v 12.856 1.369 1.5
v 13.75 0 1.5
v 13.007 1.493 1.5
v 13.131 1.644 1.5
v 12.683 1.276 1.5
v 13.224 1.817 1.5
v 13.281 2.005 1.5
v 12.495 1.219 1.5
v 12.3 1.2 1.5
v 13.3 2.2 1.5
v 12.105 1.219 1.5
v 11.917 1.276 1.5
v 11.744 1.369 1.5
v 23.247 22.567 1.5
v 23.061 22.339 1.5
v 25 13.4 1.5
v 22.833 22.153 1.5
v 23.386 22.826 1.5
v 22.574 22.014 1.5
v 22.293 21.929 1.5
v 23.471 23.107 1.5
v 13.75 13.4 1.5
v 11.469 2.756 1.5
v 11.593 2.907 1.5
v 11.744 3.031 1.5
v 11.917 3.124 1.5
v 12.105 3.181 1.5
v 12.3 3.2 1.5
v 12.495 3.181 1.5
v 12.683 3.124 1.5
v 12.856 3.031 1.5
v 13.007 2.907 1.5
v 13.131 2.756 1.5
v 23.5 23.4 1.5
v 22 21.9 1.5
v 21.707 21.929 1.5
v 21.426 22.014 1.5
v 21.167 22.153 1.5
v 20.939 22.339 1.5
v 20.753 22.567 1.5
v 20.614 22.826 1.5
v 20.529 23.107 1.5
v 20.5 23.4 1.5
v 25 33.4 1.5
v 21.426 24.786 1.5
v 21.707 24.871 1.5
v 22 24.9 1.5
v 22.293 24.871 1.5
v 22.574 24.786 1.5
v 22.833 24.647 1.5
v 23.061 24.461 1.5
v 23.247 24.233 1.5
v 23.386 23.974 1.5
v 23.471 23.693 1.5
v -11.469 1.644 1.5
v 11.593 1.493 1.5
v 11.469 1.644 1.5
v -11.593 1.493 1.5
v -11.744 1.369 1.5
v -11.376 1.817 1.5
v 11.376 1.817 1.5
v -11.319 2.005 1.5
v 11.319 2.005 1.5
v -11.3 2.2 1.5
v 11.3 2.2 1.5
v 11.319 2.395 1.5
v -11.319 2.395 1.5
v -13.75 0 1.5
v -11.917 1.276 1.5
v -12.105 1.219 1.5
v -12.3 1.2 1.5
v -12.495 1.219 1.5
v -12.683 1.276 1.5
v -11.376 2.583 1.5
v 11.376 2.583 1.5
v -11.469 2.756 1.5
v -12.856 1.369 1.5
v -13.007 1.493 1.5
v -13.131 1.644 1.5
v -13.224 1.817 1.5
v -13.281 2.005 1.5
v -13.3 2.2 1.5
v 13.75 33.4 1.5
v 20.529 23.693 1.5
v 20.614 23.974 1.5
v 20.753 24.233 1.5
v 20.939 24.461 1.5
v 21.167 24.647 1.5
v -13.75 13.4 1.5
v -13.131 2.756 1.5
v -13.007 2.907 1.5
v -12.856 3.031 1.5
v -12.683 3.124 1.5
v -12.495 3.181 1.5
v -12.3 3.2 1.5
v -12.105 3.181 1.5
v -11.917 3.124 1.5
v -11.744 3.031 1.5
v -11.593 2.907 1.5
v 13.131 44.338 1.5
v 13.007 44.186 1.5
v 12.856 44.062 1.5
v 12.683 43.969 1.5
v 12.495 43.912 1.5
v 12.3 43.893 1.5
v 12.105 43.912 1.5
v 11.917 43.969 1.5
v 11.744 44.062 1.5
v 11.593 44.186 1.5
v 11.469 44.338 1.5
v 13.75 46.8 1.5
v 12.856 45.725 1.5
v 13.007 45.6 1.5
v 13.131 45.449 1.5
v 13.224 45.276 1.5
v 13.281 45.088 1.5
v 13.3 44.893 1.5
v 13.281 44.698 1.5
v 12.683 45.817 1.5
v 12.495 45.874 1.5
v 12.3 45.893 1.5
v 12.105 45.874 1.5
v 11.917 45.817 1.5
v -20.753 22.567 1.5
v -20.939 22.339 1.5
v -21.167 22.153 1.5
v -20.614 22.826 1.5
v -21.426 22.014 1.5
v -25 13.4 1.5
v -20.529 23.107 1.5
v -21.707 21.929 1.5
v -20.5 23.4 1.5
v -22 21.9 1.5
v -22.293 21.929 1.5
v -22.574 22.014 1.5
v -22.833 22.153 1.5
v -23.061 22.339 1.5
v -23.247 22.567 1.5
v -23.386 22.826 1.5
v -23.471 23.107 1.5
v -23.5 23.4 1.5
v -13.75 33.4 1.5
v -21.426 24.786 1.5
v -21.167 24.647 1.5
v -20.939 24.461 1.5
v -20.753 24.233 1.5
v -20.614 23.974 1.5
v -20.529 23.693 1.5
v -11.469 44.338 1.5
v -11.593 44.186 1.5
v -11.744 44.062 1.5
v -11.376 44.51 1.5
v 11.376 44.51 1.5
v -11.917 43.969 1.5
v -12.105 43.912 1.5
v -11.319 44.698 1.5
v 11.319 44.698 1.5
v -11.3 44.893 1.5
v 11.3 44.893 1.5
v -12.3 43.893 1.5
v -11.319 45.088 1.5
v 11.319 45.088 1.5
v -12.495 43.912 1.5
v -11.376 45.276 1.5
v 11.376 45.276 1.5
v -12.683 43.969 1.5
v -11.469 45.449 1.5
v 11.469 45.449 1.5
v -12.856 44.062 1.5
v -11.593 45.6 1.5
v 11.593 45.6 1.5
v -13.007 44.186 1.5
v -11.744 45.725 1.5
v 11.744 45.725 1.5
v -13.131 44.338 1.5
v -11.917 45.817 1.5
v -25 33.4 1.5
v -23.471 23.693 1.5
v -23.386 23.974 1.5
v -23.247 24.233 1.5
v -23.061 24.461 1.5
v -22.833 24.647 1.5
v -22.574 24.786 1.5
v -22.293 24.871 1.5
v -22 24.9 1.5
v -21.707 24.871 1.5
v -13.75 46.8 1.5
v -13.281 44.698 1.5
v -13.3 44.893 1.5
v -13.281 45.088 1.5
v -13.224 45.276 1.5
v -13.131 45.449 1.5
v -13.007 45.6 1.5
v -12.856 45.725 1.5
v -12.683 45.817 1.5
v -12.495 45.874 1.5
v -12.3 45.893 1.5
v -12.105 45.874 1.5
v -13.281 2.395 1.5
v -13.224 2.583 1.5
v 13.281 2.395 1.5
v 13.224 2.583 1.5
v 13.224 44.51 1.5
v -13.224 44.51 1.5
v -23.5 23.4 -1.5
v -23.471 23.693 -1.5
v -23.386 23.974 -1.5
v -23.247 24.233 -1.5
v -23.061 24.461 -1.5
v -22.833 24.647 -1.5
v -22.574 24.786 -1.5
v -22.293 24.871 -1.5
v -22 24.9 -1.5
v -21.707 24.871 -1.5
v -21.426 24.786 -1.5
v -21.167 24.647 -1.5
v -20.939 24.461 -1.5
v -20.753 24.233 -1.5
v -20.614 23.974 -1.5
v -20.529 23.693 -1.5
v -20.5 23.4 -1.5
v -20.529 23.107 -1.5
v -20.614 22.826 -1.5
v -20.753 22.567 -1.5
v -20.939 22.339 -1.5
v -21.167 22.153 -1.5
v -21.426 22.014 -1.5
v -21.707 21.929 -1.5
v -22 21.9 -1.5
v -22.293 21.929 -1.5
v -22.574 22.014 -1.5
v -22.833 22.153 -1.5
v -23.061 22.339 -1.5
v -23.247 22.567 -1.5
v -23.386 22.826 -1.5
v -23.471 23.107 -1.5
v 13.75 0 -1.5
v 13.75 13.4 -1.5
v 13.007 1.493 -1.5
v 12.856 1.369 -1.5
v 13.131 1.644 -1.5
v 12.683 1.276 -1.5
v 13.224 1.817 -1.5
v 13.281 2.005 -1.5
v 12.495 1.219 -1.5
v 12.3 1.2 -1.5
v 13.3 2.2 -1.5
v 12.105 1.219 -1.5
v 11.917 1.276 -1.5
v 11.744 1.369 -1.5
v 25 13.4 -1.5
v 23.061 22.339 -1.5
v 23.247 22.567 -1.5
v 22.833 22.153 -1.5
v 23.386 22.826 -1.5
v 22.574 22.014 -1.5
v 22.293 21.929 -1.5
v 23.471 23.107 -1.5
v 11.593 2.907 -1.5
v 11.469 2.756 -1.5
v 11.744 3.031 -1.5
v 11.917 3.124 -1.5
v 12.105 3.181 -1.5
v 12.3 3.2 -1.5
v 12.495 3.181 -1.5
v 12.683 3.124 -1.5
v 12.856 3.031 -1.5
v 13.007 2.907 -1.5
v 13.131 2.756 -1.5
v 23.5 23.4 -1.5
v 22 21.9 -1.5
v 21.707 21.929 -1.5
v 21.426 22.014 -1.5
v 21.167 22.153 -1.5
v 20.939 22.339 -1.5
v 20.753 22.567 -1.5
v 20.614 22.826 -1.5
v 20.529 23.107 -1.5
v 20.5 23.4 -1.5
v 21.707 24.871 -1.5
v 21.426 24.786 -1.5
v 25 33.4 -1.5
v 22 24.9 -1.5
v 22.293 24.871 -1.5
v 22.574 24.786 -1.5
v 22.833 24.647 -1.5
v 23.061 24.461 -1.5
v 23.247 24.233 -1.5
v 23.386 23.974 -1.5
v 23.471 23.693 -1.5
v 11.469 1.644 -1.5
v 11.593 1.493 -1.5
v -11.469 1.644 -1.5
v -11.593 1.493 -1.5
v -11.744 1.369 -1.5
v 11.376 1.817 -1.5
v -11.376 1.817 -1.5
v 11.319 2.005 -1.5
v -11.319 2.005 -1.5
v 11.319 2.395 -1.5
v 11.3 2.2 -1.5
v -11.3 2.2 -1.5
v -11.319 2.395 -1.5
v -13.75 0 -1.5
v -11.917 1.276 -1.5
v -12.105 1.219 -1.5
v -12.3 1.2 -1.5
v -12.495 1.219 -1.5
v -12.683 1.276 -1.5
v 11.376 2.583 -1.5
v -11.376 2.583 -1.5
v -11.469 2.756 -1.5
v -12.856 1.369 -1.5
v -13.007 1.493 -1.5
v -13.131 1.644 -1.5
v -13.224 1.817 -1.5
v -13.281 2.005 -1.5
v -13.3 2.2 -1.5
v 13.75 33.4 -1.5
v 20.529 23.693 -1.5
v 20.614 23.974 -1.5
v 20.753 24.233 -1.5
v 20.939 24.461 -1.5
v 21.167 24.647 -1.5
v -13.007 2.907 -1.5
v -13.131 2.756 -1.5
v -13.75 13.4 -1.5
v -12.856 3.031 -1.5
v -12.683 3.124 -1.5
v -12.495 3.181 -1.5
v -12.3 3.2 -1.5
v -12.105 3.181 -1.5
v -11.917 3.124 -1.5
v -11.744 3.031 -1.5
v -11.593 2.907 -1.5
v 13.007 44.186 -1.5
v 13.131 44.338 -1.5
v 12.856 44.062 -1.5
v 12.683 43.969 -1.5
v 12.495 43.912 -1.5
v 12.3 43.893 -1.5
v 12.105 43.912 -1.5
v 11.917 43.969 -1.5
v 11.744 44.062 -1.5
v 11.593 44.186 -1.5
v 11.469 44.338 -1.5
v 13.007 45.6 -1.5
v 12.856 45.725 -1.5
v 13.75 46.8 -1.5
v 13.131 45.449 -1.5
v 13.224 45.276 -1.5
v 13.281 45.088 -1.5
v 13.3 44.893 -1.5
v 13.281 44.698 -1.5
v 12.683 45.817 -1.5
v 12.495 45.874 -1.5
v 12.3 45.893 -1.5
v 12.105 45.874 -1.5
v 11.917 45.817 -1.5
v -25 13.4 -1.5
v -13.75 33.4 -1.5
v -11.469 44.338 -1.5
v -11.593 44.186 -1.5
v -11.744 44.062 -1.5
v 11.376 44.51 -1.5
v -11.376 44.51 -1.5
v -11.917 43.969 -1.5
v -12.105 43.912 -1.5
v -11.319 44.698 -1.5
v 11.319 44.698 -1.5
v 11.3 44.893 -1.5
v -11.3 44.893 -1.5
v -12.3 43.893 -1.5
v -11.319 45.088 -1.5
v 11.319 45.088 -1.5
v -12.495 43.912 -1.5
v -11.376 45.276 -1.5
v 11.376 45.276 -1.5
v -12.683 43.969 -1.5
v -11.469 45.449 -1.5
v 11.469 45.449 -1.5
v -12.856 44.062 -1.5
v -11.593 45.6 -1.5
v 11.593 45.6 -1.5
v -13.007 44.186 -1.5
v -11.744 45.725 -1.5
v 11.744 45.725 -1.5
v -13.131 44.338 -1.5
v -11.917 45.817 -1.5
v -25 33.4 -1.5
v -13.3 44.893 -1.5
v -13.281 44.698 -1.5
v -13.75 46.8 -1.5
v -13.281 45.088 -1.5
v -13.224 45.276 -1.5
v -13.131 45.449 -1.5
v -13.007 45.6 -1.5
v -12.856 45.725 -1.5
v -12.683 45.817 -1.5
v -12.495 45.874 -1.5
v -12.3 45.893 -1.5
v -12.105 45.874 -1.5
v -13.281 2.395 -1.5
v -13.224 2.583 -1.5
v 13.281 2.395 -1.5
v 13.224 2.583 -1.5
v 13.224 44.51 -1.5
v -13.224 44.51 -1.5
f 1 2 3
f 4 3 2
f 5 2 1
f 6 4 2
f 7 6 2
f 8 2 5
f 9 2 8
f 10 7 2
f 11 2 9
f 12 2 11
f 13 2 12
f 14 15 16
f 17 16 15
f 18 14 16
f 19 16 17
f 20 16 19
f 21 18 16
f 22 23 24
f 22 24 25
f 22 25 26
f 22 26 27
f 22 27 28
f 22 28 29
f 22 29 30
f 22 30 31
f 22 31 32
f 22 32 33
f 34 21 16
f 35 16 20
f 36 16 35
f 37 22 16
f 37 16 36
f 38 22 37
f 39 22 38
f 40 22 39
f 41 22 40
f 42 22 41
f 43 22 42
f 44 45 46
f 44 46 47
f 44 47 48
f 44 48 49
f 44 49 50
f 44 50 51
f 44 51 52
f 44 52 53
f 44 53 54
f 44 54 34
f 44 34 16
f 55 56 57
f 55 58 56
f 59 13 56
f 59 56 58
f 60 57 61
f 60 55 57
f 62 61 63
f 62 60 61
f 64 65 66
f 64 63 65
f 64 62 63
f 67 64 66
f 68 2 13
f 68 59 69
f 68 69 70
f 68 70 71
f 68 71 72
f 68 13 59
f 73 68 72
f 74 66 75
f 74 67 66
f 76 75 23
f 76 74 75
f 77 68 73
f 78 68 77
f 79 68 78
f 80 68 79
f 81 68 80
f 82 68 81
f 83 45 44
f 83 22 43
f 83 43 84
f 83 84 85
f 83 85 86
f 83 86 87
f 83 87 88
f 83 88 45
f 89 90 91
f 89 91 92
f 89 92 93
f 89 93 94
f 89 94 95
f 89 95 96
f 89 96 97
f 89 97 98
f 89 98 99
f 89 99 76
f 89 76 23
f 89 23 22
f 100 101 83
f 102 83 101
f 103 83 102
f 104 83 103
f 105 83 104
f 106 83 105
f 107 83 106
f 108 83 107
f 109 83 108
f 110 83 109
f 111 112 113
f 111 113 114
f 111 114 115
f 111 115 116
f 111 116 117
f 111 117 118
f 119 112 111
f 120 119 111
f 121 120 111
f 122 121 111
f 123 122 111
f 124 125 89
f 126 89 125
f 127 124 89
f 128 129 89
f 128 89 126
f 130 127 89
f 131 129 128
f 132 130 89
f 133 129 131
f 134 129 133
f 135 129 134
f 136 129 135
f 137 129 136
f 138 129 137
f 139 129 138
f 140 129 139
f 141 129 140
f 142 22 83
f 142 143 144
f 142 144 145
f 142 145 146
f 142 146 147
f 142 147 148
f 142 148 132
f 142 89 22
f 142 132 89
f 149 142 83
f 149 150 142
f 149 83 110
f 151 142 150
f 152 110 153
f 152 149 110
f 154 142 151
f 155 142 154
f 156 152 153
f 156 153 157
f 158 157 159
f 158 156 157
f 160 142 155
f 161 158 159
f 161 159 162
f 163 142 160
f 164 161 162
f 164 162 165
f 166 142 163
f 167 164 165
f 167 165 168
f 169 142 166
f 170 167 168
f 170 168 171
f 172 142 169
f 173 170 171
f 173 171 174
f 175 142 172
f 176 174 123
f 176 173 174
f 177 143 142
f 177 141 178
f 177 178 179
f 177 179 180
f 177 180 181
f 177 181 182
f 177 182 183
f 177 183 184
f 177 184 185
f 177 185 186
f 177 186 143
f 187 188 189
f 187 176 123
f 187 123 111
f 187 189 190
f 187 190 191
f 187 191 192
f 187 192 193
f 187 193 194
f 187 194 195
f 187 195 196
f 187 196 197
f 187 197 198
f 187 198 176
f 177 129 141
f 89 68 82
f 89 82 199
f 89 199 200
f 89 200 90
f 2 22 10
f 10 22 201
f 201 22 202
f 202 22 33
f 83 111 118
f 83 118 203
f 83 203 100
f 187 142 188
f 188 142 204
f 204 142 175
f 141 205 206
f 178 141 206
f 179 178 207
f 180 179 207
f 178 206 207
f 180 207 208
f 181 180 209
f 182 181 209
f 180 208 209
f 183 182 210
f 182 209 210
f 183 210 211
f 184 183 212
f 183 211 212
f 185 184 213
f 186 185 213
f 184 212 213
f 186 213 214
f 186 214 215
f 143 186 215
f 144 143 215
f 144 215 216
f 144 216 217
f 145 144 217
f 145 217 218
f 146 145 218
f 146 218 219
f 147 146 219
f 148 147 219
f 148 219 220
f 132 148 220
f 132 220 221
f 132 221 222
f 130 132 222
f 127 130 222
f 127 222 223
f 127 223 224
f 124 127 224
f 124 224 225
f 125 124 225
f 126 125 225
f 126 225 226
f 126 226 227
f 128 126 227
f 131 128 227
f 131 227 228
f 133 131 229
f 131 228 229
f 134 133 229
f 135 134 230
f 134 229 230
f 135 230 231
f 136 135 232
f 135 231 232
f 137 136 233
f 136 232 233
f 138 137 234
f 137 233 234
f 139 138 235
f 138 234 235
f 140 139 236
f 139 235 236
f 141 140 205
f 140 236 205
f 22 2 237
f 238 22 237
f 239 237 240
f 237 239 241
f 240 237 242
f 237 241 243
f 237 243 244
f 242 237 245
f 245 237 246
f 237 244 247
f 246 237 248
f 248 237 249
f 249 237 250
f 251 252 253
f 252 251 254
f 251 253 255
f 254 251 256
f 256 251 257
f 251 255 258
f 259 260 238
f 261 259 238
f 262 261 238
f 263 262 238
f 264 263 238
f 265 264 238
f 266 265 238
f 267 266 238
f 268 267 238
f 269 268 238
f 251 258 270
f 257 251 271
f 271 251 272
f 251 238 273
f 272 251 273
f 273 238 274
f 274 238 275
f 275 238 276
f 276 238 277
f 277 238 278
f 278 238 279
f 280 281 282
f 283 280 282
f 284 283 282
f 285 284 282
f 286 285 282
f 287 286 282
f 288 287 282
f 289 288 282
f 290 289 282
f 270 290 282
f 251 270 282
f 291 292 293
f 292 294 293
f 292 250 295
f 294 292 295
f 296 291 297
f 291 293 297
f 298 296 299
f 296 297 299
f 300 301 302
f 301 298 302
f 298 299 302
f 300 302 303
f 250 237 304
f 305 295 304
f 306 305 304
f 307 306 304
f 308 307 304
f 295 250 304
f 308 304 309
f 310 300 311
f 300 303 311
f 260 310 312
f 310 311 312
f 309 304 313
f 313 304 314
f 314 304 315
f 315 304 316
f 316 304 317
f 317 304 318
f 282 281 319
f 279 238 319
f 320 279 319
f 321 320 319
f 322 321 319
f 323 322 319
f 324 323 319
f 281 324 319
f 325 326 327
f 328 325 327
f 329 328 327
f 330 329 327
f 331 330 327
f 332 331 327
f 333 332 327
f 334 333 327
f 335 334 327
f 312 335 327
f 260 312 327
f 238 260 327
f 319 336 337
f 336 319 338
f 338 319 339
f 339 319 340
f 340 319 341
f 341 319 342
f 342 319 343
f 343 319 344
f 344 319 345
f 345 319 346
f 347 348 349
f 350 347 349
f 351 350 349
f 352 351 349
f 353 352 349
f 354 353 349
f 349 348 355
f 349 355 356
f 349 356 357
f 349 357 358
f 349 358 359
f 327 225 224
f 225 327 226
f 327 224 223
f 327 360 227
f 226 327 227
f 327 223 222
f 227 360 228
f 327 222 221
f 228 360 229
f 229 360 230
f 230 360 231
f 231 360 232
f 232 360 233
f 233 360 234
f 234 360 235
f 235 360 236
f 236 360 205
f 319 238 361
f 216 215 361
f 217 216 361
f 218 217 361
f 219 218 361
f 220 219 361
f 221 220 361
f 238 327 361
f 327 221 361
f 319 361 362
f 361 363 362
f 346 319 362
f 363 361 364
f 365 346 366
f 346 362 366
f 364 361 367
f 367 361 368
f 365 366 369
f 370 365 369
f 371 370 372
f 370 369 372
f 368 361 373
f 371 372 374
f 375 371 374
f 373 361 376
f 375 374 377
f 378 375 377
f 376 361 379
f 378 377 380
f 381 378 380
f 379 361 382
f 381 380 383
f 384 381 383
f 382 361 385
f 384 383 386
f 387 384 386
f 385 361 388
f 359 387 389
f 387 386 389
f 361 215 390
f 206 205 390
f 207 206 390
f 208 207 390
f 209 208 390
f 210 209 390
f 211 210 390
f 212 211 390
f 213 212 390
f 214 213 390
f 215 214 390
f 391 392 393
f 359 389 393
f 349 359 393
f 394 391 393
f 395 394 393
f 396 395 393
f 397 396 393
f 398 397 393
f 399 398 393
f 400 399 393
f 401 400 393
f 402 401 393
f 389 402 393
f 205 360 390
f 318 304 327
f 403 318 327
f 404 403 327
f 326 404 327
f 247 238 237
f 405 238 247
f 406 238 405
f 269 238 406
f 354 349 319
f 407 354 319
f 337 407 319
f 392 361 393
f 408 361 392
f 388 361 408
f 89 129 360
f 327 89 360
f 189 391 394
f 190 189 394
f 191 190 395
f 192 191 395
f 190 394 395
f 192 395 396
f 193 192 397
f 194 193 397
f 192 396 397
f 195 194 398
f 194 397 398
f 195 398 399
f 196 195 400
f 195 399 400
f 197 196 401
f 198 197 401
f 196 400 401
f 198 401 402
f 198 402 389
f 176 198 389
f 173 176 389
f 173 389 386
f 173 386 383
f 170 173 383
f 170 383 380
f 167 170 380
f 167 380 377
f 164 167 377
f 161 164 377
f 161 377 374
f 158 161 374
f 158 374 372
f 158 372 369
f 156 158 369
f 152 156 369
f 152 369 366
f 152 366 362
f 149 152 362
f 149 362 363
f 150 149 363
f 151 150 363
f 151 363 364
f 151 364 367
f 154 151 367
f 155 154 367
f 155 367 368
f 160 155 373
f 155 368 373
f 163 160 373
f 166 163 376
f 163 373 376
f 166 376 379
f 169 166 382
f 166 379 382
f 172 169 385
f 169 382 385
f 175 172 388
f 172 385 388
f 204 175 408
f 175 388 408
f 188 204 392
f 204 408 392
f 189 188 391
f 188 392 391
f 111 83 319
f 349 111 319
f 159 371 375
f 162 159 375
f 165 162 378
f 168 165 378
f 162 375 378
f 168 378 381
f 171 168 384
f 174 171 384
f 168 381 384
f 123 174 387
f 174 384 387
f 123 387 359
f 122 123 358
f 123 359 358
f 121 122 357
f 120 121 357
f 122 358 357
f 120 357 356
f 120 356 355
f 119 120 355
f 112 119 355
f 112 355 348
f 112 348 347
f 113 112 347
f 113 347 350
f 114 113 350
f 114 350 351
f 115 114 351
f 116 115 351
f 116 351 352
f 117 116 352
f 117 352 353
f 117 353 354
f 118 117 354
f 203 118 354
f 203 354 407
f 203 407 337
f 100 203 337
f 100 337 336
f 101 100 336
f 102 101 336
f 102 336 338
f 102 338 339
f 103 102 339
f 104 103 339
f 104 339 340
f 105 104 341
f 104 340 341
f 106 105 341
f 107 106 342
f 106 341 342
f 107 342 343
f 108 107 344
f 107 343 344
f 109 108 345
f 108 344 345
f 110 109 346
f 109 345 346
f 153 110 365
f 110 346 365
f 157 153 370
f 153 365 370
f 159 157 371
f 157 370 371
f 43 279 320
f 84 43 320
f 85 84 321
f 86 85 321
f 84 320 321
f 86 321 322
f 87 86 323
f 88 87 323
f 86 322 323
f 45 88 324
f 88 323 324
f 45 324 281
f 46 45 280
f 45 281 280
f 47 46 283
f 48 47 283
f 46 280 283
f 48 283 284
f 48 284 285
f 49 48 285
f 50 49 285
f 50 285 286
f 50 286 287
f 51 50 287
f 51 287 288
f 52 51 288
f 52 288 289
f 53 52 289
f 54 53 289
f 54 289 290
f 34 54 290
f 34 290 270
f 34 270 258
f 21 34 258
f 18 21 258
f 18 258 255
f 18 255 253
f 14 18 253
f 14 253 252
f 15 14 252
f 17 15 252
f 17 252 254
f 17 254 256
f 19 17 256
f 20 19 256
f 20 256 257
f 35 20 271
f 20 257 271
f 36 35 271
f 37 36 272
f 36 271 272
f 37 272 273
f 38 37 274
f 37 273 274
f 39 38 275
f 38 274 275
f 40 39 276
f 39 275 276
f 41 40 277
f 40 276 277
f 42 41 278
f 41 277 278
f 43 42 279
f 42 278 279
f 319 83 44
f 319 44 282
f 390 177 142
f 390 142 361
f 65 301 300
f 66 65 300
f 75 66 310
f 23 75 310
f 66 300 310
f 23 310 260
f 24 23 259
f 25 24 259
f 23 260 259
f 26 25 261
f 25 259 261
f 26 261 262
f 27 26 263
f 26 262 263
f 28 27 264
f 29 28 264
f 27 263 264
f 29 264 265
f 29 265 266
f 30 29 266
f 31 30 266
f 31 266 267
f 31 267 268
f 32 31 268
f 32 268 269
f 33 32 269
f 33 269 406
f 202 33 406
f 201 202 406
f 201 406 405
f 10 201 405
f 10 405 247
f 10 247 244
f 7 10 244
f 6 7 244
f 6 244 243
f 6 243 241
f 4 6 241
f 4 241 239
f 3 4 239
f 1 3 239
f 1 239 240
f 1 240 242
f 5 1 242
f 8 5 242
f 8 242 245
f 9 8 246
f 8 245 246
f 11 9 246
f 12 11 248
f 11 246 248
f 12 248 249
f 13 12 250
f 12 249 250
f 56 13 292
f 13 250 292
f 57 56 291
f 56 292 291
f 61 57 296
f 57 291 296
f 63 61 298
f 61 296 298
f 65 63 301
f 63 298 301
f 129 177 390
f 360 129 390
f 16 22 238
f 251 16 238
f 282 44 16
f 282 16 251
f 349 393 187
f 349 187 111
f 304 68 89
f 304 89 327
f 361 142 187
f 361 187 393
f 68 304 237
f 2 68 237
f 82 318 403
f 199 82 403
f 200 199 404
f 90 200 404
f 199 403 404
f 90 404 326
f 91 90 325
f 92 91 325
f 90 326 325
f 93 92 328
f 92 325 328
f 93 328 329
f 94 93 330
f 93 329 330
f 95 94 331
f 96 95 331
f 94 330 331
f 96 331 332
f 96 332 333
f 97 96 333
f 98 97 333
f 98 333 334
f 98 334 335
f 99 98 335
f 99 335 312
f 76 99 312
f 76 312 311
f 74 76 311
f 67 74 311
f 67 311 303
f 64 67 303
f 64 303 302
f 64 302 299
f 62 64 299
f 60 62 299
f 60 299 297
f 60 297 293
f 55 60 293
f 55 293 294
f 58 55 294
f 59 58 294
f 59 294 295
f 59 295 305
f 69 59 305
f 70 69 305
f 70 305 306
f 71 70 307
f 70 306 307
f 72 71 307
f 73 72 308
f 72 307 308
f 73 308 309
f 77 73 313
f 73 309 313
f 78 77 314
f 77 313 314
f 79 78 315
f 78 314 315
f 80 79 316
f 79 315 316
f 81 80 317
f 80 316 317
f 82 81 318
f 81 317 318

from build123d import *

# Parameters (mm, degrees)
SKETCH_2_W           = 27.5
SKETCH_2_H           = 3
EXTRUDE_1_DEPTH      = 46.8
SKETCH_3_R           = 1
CUT_EXTRUDE_1_DEPTH  = 46.8
EXTRUDE_2_DEPTH      = 25
EXTRUDE_2_DEPTH_BACK = 25
SKETCH_4_W           = 3
SKETCH_4_H           = 20
SKETCH_5_R           = 1.5
CUT_EXTRUDE_2_DEPTH  = 25


with BuildPart() as part:
    # 草图2 → 凸台-拉伸1 (new body)
    with BuildSketch(Plane(origin=(0, 0, 0), x_dir=(1, 0, 0), z_dir=(0, 1, 0))):
        Rectangle(SKETCH_2_W, SKETCH_2_H)
    extrude(amount=EXTRUDE_1_DEPTH)

    # 草图3 → 切除-拉伸1 (cut)
    with BuildSketch(Plane(origin=(0, 0, -1.5), x_dir=(-1, 0, 0), z_dir=(0, 0, -1))):
        with Locations((-12.3, 44.893116562)):
            Circle(SKETCH_3_R)
        with Locations((-12.3, 2.2)):
            Circle(SKETCH_3_R)
        with Locations((12.3, 2.2)):
            Circle(SKETCH_3_R)
        with Locations((12.3, 44.893116562)):
            Circle(SKETCH_3_R)
    extrude(amount=-CUT_EXTRUDE_1_DEPTH, mode=Mode.SUBTRACT)

    # 草图4 → 凸台-拉伸2 (add, two sides: drawn at the far end of the back side and taken through both)
    with BuildSketch(Plane(origin=(0, 0, 0), x_dir=(0, 0, -1), z_dir=(1, 0, 0)).offset(-EXTRUDE_2_DEPTH_BACK)):
        with Locations((0, 23.4)):
            Rectangle(SKETCH_4_W, SKETCH_4_H)
    extrude(amount=EXTRUDE_2_DEPTH + EXTRUDE_2_DEPTH_BACK)

    # 草图5 → 切除-拉伸2 (cut)
    with BuildSketch(Plane(origin=(0, 0, -1.5), x_dir=(-1, 0, 0), z_dir=(0, 0, -1))):
        with Locations((-22, 23.4)):
            Circle(SKETCH_5_R)
        with Locations((22, 23.4)):
            Circle(SKETCH_5_R)
    extrude(amount=-CUT_EXTRUDE_2_DEPTH, mode=Mode.SUBTRACT)


solid = part.part
